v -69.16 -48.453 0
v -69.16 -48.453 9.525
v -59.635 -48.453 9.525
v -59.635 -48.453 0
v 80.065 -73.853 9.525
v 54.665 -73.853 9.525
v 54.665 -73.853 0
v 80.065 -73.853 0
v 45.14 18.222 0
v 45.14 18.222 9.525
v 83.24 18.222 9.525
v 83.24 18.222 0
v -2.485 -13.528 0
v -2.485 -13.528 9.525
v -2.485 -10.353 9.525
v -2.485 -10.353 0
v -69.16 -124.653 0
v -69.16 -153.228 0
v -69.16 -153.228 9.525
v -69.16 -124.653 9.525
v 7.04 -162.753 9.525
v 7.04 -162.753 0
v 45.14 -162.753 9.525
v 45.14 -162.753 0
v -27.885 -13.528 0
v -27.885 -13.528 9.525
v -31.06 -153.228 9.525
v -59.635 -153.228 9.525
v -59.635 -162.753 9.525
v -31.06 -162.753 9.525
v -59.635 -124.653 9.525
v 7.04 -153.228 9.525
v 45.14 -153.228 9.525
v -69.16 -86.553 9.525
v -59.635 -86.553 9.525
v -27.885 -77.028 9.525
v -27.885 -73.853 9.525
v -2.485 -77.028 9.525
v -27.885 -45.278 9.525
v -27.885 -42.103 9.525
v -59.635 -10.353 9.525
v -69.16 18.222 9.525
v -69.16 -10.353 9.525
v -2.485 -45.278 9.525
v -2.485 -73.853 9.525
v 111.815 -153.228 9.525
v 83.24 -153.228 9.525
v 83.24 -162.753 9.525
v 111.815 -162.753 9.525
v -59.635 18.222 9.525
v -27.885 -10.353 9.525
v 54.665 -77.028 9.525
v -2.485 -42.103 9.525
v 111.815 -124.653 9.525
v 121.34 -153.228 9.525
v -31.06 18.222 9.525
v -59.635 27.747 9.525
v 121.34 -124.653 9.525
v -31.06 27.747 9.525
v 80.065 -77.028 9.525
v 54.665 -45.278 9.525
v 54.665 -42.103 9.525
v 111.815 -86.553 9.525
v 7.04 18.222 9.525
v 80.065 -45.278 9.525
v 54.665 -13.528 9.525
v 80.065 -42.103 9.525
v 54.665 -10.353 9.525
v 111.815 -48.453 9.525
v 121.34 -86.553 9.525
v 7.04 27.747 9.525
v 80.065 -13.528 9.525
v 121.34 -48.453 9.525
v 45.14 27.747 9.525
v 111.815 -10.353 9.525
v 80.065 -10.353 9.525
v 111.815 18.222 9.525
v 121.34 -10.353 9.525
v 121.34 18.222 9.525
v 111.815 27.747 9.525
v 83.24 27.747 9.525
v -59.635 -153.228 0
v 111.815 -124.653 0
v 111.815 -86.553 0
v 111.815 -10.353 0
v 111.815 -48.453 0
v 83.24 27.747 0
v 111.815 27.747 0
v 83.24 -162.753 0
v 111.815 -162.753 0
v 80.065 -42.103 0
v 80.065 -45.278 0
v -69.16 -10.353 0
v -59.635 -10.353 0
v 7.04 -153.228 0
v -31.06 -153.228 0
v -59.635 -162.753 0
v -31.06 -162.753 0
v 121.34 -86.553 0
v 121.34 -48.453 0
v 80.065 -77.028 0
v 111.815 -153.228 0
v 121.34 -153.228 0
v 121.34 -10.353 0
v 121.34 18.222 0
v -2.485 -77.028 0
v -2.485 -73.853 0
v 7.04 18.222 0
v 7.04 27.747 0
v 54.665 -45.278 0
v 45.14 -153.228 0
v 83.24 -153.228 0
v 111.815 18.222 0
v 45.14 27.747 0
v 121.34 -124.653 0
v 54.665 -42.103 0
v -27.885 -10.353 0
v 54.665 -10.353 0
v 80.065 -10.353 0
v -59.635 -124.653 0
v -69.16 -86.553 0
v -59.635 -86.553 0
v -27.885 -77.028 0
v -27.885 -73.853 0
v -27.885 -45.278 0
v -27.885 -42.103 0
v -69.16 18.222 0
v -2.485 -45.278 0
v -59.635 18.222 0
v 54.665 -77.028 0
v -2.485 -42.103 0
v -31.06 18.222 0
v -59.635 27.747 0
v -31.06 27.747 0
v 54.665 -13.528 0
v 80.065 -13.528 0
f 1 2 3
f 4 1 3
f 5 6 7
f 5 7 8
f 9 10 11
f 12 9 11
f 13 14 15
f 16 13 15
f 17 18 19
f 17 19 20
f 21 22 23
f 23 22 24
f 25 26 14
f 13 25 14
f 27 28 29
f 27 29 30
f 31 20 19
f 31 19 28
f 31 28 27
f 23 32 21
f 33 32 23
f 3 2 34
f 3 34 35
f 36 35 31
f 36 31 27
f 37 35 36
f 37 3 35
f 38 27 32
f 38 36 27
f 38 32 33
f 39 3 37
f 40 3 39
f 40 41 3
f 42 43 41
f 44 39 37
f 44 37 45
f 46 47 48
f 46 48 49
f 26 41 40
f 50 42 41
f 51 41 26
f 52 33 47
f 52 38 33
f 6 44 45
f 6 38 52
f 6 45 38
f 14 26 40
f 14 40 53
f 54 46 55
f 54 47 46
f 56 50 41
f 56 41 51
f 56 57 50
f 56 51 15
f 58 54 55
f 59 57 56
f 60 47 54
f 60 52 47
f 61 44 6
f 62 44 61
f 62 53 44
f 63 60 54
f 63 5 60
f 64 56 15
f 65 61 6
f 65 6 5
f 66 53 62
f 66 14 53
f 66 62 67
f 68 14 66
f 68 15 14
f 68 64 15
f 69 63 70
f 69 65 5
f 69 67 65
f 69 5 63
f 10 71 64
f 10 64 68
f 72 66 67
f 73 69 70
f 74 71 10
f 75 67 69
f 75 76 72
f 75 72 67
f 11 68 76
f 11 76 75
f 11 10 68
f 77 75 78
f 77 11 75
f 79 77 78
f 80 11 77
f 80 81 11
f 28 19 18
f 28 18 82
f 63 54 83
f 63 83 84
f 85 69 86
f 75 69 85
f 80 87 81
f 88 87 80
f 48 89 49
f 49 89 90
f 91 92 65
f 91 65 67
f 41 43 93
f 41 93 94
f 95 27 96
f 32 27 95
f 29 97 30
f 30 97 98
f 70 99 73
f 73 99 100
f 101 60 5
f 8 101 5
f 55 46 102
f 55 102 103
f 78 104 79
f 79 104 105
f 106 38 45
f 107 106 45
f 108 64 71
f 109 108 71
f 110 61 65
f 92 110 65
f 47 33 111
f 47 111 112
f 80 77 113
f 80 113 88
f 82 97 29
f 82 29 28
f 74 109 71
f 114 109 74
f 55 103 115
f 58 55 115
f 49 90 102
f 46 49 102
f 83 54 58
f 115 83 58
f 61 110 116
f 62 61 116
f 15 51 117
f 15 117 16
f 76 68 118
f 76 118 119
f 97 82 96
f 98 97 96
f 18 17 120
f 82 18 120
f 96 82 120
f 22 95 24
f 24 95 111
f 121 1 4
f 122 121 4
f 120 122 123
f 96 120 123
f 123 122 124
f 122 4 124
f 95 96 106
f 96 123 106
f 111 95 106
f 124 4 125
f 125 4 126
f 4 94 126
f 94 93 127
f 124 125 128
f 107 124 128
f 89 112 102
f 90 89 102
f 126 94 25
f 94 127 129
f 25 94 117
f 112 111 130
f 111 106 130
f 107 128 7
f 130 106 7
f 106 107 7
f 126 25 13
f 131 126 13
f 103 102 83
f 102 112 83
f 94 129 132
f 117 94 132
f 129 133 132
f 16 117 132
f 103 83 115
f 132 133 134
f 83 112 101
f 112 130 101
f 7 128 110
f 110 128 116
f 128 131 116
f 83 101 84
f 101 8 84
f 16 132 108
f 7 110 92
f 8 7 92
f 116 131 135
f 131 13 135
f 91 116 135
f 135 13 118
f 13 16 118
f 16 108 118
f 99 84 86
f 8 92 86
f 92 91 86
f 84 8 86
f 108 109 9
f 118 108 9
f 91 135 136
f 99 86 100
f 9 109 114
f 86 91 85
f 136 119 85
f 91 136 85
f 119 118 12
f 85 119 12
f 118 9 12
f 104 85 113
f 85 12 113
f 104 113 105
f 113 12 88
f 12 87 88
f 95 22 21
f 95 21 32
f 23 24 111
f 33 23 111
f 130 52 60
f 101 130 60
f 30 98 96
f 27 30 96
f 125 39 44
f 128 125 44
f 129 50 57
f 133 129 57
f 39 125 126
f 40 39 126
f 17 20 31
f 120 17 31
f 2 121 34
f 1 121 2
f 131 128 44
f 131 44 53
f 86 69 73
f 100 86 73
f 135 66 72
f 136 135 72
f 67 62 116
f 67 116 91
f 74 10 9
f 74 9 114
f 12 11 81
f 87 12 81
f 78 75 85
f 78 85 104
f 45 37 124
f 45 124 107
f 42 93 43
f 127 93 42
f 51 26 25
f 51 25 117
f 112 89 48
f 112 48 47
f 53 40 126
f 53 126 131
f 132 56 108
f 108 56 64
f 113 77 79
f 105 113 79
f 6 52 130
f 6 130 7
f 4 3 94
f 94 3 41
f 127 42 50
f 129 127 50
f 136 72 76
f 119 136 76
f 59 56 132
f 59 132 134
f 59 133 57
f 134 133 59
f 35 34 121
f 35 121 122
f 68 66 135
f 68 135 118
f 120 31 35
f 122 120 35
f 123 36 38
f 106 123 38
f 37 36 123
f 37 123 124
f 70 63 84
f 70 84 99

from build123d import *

# Parameters (mm, degrees)
SKETCH1_W           = 190.5
SKETCH1_H           = 190.5
BOSS_EXTRUDE2_DEPTH = 9.525
SKETCH2_W           = 38.1
SKETCH2_H           = 9.525
CUT_EXTRUDE1_DEPTH  = 9.525
SKETCH3_W           = 38.1
SKETCH3_H           = 9.525
CUT_EXTRUDE2_DEPTH  = 9.525
SKETCH4_W           = 9.525
SKETCH4_H           = 38.1
CUT_EXTRUDE3_DEPTH  = 9.525
SKETCH5_W           = 9.525
SKETCH5_H           = 38.1
CUT_EXTRUDE4_DEPTH  = 9.525
SKETCH6_W           = 38.1
SKETCH6_H           = 9.525
CUT_EXTRUDE5_DEPTH  = 9.525
SKETCH7_W           = 38.1
SKETCH7_H           = 9.525
CUT_EXTRUDE6_DEPTH  = 9.525
SKETCH8_W           = 9.525
SKETCH8_H           = 38.1
CUT_EXTRUDE7_DEPTH  = 9.525
SKETCH9_W           = 9.525
SKETCH9_H           = 38.1
CUT_EXTRUDE8_DEPTH  = 9.525
SKETCH10_W          = 9.525
SKETCH10_H          = 9.525
CUT_EXTRUDE9_DEPTH  = 9.525
SKETCH11_W          = 9.525
SKETCH11_H          = 9.525
CUT_EXTRUDE10_DEPTH = 9.525
SKETCH12_W          = 9.525
SKETCH12_H          = 9.525
CUT_EXTRUDE11_DEPTH = 9.525
SKETCH13_W          = 9.525
SKETCH13_H          = 9.525
CUT_EXTRUDE12_DEPTH = 9.525
SKETCH14_W          = 25.4
SKETCH14_H          = 3.175
CUT_EXTRUDE13_DEPTH = 204.230898008


with BuildPart() as part:
    # Sketch1 → Boss-Extrude2 (new body)
    with BuildSketch(Plane.XY):
        with Locations((26.090217391, -67.50326087)):
            Rectangle(SKETCH1_W, SKETCH1_H)
    extrude(amount=BOSS_EXTRUDE2_DEPTH)

    # Sketch2 → Cut-Extrude1 (cut)
    with BuildSketch(Plane.XY.offset(9.525)):
        with Locations((-12.009782609, 22.98423913)):
            Rectangle(SKETCH2_W, SKETCH2_H)
    extrude(amount=-CUT_EXTRUDE1_DEPTH, mode=Mode.SUBTRACT)

    # Sketch3 → Cut-Extrude2 (cut)
    with BuildSketch(Plane.XY.offset(9.525)):
        with Locations((64.190217391, 22.98423913)):
            Rectangle(SKETCH3_W, SKETCH3_H)
    extrude(amount=-CUT_EXTRUDE2_DEPTH, mode=Mode.SUBTRACT)

    # Sketch4 → Cut-Extrude3 (cut)
    with BuildSketch(Plane.XY.offset(9.525)):
        with Locations((116.577717391, -29.40326087)):
            Rectangle(SKETCH4_W, SKETCH4_H)
    extrude(amount=-CUT_EXTRUDE3_DEPTH, mode=Mode.SUBTRACT)

    # Sketch5 → Cut-Extrude4 (cut)
    with BuildSketch(Plane.XY.offset(9.525)):
        with Locations((116.577717391, -105.60326087)):
            Rectangle(SKETCH5_W, SKETCH5_H)
    extrude(amount=-CUT_EXTRUDE4_DEPTH, mode=Mode.SUBTRACT)

    # Sketch6 → Cut-Extrude5 (cut)
    with BuildSketch(Plane.XY.offset(9.525)):
        with Locations((64.190217391, -157.99076087)):
            Rectangle(SKETCH6_W, SKETCH6_H)
    extrude(amount=-CUT_EXTRUDE5_DEPTH, mode=Mode.SUBTRACT)

    # Sketch7 → Cut-Extrude6 (cut)
    with BuildSketch(Plane.XY.offset(9.525)):
        with Locations((-12.009782609, -157.99076087)):
            Rectangle(SKETCH7_W, SKETCH7_H)
    extrude(amount=-CUT_EXTRUDE6_DEPTH, mode=Mode.SUBTRACT)

    # Sketch8 → Cut-Extrude7 (cut)
    with BuildSketch(Plane.XY.offset(9.525)):
        with Locations((-64.397282609, -105.60326087)):
            Rectangle(SKETCH8_W, SKETCH8_H)
    extrude(amount=-CUT_EXTRUDE7_DEPTH, mode=Mode.SUBTRACT)

    # Sketch9 → Cut-Extrude8 (cut)
    with BuildSketch(Plane.XY.offset(9.525)):
        with Locations((-64.397282609, -29.40326087)):
            Rectangle(SKETCH9_W, SKETCH9_H)
    extrude(amount=-CUT_EXTRUDE8_DEPTH, mode=Mode.SUBTRACT)

    # Sketch10 → Cut-Extrude9 (cut)
    with BuildSketch(Plane.XY.offset(9.525)):
        with Locations((-64.397282609, -157.99076087)):
            Rectangle(SKETCH10_W, SKETCH10_H)
    extrude(amount=-CUT_EXTRUDE9_DEPTH, mode=Mode.SUBTRACT)

    # Sketch11 → Cut-Extrude10 (cut)
    with BuildSketch(Plane.XY.offset(9.525)):
        with Locations((-64.397282609, 22.98423913)):
            Rectangle(SKETCH11_W, SKETCH11_H)
    extrude(amount=-CUT_EXTRUDE10_DEPTH, mode=Mode.SUBTRACT)

    # Sketch12 → Cut-Extrude11 (cut)
    with BuildSketch(Plane.XY.offset(9.525)):
        with Locations((116.577717391, 22.98423913)):
            Rectangle(SKETCH12_W, SKETCH12_H)
    extrude(amount=-CUT_EXTRUDE11_DEPTH, mode=Mode.SUBTRACT)

    # Sketch13 → Cut-Extrude12 (cut)
    with BuildSketch(Plane.XY.offset(9.525)):
        with Locations((116.577717391, -157.99076087)):
            Rectangle(SKETCH13_W, SKETCH13_H)
    extrude(amount=-CUT_EXTRUDE12_DEPTH, mode=Mode.SUBTRACT)

    # Sketch14 → Cut-Extrude13 (cut, through all)
    with BuildSketch(Plane.XY.offset(9.525)):
        with Locations((67.365217391, -11.94076087)):
            Rectangle(SKETCH14_W, SKETCH14_H)
        with Locations((-15.184782609, -11.94076087)):
            Rectangle(SKETCH14_W, SKETCH14_H)
        with Locations((67.365217391, -43.69076087)):
            Rectangle(SKETCH14_W, SKETCH14_H)
        with Locations((-15.184782609, -43.69076087)):
            Rectangle(SKETCH14_W, SKETCH14_H)
        with Locations((67.365217391, -75.44076087)):
            Rectangle(SKETCH14_W, SKETCH14_H)
        with Locations((-15.184782609, -75.44076087)):
            Rectangle(SKETCH14_W, SKETCH14_H)
    extrude(amount=-CUT_EXTRUDE13_DEPTH, mode=Mode.SUBTRACT)


solid = part.part
